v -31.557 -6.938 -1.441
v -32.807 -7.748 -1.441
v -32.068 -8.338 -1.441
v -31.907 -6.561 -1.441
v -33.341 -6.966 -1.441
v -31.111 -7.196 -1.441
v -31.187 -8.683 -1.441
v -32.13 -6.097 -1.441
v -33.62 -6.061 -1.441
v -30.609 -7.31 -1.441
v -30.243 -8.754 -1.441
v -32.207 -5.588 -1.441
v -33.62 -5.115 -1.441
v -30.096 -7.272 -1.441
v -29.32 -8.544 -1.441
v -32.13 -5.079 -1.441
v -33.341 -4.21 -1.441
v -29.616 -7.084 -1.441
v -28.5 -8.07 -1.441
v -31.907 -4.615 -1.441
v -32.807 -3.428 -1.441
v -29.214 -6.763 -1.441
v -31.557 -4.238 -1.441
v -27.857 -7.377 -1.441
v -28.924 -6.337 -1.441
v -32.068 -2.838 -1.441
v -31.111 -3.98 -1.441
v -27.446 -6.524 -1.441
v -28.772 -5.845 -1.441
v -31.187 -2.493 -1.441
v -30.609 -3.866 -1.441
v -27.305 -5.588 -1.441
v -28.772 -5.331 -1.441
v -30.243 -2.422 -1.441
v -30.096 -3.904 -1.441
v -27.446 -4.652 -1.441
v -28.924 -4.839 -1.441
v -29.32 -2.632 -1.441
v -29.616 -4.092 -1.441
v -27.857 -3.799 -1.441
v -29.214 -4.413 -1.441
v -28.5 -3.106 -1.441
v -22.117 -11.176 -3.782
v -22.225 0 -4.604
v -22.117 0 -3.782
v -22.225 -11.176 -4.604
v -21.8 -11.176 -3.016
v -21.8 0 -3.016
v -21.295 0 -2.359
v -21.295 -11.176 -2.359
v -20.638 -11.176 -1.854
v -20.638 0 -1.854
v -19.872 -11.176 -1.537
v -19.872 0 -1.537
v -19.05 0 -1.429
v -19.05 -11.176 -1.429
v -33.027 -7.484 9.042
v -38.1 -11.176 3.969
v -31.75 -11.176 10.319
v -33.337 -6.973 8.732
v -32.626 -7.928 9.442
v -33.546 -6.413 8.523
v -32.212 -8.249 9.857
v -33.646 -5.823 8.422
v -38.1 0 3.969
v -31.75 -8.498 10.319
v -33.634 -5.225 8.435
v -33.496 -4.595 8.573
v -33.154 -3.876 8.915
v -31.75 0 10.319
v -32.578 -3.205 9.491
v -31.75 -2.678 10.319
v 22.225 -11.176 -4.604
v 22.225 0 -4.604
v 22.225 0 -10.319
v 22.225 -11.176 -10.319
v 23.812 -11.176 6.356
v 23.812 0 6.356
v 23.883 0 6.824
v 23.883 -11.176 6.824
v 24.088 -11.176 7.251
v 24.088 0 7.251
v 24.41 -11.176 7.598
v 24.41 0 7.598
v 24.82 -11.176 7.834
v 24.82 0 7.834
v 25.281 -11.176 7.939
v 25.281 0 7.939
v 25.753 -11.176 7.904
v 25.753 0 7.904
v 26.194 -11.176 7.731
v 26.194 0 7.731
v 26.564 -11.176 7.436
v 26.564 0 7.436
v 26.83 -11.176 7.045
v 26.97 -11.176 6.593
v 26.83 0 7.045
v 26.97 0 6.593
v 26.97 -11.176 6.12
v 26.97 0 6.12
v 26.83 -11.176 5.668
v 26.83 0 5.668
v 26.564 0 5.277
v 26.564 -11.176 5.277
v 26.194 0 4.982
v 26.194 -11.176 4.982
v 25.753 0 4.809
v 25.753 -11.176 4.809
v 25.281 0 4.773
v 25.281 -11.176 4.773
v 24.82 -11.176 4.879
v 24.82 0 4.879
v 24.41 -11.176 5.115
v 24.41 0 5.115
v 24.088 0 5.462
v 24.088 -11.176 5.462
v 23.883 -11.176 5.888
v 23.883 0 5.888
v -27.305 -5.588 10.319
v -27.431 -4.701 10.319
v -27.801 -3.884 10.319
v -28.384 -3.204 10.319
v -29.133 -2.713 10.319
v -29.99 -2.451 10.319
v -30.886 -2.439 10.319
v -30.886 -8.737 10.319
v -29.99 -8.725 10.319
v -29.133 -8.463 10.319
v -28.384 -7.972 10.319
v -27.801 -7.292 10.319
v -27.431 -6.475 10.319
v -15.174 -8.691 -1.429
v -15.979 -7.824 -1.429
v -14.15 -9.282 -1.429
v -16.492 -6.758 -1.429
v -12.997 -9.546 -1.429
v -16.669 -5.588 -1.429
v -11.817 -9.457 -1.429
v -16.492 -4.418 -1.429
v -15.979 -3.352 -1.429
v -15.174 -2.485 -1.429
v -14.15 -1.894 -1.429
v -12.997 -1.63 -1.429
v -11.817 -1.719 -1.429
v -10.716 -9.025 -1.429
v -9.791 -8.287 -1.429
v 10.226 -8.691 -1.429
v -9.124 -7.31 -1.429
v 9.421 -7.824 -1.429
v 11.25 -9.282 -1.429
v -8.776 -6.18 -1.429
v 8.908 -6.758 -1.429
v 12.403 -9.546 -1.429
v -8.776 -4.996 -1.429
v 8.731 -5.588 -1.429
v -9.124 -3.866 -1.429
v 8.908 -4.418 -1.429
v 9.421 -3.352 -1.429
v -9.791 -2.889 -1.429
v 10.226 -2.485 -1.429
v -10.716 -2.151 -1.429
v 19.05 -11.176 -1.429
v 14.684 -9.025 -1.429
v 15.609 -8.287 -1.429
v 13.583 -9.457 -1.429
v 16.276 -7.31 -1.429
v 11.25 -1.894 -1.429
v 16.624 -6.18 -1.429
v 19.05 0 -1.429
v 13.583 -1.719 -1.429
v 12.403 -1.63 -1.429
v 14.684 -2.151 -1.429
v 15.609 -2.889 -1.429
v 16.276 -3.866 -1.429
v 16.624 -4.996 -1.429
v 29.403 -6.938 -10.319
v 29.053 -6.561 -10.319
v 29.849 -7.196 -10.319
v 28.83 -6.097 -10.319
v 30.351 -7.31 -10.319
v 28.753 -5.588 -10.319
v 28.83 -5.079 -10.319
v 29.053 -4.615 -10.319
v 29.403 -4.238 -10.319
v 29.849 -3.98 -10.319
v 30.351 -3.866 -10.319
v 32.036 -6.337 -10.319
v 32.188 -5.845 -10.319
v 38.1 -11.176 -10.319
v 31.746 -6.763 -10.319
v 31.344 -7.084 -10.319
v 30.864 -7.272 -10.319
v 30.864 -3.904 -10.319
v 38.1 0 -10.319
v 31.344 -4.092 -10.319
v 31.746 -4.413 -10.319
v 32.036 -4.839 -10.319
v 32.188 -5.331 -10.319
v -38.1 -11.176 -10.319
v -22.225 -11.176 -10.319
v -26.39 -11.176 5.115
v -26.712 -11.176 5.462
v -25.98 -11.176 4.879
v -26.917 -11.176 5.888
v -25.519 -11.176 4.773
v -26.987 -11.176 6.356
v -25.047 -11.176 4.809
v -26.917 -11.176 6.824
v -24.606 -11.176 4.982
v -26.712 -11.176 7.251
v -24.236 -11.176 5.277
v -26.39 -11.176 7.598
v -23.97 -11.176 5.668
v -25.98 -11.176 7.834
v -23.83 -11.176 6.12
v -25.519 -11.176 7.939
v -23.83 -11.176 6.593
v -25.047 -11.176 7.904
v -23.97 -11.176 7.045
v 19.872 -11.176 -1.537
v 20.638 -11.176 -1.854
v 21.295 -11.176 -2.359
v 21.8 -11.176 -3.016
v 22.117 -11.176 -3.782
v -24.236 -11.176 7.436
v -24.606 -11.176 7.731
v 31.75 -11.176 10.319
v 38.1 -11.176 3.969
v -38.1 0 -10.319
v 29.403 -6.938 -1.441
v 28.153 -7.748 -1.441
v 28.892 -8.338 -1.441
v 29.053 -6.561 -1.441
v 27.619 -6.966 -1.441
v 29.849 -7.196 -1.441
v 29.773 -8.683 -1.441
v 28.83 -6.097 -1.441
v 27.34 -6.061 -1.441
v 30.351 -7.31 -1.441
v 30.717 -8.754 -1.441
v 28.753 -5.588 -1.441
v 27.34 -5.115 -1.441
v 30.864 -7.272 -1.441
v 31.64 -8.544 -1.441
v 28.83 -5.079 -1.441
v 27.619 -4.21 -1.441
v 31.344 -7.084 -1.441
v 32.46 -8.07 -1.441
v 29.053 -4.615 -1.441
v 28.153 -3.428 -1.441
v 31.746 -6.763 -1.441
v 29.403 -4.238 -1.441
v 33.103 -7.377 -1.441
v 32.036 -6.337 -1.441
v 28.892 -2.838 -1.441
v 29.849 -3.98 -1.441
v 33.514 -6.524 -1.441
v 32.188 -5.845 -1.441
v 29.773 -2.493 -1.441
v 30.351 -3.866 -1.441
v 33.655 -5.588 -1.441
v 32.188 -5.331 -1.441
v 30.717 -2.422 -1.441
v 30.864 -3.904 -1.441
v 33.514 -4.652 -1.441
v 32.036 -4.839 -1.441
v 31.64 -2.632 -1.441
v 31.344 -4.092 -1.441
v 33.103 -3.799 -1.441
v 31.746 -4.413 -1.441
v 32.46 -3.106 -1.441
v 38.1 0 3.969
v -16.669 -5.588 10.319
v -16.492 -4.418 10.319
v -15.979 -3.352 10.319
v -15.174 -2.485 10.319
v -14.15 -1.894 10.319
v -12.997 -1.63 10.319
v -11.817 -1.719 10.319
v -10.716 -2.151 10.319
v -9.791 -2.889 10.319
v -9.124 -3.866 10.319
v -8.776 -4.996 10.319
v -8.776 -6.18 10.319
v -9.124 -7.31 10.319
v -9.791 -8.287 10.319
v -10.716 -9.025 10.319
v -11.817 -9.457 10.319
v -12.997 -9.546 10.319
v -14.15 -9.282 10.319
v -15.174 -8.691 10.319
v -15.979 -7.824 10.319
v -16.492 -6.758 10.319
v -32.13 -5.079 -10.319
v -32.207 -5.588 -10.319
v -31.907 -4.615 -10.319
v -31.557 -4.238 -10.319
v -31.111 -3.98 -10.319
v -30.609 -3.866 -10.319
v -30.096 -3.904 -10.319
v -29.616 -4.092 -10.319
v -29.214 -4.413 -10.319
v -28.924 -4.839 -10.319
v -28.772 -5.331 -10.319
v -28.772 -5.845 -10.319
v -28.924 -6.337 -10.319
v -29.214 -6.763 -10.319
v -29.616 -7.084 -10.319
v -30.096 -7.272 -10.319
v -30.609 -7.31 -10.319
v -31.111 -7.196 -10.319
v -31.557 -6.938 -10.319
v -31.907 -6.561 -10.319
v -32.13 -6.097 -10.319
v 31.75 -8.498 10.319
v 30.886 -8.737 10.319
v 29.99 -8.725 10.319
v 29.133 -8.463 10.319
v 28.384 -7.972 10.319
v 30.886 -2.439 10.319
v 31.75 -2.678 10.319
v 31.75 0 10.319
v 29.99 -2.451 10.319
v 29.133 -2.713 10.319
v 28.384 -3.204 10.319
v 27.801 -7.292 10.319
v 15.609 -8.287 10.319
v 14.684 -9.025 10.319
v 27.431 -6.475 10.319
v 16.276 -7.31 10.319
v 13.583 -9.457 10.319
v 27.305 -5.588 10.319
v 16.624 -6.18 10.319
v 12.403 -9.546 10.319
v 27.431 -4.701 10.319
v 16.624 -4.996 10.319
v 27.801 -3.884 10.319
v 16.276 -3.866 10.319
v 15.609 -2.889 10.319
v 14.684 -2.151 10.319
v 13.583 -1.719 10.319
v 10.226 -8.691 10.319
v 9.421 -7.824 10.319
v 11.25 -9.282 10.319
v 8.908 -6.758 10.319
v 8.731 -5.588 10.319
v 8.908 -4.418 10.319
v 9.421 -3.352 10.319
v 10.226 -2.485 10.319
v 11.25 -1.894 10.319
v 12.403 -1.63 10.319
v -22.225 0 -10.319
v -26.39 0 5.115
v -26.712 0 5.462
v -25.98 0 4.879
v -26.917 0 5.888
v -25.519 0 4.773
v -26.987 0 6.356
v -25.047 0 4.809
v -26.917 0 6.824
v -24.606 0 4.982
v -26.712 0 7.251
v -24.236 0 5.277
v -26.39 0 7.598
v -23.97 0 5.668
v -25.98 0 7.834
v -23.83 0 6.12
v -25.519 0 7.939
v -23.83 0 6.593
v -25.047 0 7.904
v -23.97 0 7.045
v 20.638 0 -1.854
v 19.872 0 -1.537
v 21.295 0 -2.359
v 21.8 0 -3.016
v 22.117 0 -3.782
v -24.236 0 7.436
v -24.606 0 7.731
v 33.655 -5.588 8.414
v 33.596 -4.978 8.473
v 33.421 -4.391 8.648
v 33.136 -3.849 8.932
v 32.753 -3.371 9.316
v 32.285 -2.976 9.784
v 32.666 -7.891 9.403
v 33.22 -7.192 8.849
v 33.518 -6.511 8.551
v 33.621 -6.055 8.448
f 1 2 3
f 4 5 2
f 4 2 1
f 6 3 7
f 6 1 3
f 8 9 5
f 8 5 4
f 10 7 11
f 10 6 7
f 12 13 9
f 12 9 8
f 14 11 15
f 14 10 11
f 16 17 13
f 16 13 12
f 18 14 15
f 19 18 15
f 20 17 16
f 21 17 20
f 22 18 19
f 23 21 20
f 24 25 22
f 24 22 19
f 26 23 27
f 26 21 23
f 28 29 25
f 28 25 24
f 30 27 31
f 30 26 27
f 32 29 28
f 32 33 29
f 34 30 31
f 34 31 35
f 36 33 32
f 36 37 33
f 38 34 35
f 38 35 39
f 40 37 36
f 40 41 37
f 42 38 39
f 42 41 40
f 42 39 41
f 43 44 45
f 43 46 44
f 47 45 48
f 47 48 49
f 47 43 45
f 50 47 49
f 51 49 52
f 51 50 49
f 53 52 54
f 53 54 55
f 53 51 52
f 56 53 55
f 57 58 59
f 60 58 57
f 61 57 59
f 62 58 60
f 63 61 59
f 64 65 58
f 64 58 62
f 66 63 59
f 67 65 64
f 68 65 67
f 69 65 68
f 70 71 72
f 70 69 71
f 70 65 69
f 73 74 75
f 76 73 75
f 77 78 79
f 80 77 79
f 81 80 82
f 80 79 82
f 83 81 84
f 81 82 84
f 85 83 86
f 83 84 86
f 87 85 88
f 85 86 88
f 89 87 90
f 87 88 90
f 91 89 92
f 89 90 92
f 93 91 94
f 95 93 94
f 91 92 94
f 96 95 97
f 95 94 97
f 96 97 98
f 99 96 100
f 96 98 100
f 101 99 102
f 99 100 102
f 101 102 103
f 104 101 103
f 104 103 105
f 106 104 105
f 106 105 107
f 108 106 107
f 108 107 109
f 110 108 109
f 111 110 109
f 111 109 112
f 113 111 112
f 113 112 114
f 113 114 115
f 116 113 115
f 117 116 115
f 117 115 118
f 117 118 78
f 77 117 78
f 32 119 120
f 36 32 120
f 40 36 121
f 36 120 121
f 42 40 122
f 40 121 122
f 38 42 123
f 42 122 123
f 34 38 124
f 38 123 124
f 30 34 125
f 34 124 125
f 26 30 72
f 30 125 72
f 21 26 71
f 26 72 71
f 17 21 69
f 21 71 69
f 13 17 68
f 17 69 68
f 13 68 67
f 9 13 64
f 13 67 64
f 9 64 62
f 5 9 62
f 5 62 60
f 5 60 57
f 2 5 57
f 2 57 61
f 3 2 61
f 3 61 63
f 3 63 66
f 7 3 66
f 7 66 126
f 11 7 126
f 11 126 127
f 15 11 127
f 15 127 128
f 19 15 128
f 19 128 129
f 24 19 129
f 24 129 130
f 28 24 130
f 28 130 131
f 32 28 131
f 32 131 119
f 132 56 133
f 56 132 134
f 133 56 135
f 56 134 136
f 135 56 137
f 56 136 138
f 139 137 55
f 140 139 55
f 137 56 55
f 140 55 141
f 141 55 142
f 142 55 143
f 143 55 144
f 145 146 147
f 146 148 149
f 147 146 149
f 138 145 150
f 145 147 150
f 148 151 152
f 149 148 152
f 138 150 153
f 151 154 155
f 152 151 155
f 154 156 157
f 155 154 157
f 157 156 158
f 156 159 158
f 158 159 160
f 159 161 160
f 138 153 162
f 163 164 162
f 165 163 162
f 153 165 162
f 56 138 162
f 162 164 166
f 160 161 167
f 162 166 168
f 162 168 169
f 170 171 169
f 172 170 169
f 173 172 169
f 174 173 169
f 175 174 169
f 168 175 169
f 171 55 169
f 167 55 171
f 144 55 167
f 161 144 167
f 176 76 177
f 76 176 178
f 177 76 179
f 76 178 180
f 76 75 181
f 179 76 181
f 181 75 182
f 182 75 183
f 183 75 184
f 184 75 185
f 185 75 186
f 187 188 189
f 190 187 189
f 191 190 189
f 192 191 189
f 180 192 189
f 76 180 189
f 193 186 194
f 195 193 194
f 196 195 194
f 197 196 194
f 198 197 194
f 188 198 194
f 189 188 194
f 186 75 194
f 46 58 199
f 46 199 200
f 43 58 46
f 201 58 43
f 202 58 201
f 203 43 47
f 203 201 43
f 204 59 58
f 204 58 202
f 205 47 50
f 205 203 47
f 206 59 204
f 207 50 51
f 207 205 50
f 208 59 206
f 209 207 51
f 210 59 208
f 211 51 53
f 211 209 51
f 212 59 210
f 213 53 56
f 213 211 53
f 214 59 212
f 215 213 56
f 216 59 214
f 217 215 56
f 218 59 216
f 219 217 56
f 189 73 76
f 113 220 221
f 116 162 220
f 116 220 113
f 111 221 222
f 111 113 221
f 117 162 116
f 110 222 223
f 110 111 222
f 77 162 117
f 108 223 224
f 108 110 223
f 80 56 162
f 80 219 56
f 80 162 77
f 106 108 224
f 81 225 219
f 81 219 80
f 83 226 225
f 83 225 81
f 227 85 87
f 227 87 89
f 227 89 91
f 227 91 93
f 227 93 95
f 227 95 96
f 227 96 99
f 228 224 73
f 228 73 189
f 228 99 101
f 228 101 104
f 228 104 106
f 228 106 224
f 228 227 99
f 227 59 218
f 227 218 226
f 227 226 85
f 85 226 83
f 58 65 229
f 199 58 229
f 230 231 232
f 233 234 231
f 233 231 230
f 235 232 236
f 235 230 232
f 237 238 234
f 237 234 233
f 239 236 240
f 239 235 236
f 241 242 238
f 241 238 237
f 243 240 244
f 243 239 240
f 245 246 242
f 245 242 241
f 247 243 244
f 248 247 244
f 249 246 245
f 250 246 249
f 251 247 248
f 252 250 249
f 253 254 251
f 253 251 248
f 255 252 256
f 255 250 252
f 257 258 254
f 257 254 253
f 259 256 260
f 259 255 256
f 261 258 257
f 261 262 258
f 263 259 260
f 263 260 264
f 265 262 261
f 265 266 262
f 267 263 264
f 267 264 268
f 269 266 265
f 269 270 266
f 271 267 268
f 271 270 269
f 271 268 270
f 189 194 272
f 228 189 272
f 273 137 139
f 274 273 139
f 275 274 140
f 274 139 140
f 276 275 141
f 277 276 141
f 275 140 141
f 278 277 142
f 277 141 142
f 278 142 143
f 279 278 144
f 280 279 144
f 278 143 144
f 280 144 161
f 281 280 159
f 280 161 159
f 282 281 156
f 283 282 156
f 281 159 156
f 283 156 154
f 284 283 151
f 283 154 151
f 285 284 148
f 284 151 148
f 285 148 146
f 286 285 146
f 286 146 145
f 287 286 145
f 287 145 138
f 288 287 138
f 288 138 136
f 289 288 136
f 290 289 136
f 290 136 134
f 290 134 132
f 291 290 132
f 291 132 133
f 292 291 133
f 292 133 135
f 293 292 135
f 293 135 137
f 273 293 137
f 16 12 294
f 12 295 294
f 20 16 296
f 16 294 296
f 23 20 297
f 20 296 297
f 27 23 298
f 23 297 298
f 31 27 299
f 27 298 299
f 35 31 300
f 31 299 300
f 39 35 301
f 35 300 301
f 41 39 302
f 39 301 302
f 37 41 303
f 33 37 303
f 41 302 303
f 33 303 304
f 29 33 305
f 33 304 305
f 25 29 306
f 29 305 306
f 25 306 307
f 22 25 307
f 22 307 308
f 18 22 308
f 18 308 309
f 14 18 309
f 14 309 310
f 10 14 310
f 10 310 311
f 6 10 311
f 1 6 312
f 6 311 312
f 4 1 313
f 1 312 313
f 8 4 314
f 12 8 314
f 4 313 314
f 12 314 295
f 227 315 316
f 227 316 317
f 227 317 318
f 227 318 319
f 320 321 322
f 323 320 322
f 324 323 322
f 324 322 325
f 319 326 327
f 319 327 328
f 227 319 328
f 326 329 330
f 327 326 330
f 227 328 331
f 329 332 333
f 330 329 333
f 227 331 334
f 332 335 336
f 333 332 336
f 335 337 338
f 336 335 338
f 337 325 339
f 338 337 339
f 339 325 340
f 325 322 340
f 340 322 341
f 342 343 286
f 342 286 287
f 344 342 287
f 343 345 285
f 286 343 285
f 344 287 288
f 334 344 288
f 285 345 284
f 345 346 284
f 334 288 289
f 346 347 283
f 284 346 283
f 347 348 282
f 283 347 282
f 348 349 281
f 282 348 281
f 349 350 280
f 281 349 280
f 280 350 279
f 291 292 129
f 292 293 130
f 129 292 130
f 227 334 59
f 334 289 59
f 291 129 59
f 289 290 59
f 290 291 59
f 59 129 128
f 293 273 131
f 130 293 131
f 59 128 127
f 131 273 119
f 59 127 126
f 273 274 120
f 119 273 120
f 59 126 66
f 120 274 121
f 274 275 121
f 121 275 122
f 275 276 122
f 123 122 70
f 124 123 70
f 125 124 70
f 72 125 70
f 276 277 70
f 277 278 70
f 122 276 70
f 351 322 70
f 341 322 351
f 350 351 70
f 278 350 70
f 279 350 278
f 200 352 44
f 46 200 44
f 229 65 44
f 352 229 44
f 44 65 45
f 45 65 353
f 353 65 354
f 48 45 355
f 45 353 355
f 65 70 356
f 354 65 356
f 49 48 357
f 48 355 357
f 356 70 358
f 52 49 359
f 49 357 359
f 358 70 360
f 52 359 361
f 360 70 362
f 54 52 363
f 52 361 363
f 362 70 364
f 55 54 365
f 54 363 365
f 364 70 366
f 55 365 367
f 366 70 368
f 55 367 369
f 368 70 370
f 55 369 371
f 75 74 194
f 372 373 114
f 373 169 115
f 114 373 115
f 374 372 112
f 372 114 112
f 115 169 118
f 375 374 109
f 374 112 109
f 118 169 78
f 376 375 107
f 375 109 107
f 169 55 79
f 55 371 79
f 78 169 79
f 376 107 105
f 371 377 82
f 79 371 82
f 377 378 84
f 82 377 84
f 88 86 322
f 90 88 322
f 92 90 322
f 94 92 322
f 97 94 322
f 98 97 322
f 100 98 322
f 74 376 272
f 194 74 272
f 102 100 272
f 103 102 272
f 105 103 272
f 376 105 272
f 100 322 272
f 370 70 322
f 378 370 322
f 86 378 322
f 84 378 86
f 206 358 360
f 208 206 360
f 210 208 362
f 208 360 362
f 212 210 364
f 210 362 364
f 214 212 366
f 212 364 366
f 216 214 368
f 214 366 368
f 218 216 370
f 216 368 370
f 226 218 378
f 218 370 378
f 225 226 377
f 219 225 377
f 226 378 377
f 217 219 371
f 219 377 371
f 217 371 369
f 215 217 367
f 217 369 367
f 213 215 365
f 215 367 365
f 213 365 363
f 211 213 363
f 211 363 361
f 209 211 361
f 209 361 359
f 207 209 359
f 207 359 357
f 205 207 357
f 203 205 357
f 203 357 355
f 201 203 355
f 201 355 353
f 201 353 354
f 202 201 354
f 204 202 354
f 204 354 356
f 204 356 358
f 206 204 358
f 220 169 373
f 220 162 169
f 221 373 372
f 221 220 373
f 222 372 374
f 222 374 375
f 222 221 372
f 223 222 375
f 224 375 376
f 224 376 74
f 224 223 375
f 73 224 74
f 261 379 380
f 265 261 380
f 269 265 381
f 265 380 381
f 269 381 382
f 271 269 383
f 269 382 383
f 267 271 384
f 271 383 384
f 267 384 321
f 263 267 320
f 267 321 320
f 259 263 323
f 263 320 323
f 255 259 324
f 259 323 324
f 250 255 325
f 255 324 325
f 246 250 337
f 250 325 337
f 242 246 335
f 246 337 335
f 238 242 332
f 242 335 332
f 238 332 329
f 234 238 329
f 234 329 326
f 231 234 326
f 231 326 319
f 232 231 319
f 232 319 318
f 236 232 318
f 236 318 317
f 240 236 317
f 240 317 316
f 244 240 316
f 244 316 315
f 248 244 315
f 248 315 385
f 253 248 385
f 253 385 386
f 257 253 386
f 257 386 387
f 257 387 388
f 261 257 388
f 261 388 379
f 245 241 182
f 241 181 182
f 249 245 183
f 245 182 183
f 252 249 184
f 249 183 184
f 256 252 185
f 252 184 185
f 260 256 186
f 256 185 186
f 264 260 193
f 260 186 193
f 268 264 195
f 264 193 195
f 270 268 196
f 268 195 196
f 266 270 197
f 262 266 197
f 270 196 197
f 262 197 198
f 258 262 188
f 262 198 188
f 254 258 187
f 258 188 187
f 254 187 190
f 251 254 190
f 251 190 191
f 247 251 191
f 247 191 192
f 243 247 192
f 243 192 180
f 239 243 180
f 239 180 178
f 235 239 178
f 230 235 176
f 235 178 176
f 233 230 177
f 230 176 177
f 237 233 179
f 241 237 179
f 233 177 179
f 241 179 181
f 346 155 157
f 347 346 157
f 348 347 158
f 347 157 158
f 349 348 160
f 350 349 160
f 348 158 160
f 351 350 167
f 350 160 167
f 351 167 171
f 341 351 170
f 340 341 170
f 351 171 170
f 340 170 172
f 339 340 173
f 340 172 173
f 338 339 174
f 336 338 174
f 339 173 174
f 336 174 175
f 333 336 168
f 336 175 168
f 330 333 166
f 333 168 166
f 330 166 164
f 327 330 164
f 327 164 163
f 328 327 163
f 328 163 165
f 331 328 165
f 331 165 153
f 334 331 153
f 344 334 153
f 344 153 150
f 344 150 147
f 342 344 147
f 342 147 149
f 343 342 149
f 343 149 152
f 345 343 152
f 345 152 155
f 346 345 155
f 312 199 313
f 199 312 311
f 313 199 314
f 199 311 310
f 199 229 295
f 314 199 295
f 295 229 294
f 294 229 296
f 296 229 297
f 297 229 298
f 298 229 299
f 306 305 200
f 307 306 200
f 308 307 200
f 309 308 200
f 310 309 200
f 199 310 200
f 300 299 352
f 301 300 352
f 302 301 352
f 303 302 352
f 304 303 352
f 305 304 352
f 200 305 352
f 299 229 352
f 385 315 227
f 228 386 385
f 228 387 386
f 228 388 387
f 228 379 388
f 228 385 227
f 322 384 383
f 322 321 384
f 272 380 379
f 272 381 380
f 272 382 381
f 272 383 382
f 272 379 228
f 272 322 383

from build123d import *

# Parameters (mm, degrees)
F1_DEPTH       = 11.176
F2_R           = 3.175
F5_D           = 3.4544
F5_START       = 10.33145
F5_CBORE_D     = 6.35
F5_CBORE_DEPTH = 11.7602
F6_T1_DEPTH    = 43.8363739472
F8_D           = 7.9375
F10_D          = 3.175


# Not quite as in the source:
# - a fillet or chamfer that OpenCascade refuses, or shapes differently, is made with other operations: its cross-section is extruded or revolved along the edge and cut away or added


with BuildPart() as f1:
    # F0 (on Front) → F1 (new body)
    with BuildSketch(Plane.XZ):
        Polygon((38.1, 10.31875), (-38.1, 10.31875), (-38.1, -10.31875), (-22.225, -10.31875), (-22.225, -1.42875), (22.225, -1.42875), (22.225, -10.31875), (38.1, -10.31875), align=None)
    extrude(amount=F1_DEPTH)

    # F2
    f2_edges = [f1.edges().sort_by_distance(p)[0] for p in [
        (-22.225, -5.588, -1.42875),
        (22.225, -5.588, -1.42875),
    ]]
    fillet(f2_edges, radius=F2_R)

    # F5 (through all)
    # its depths count from where the whole tool has entered the part; down to there all is cleared
    with Locations(Plane.XY.offset(20.6502).offset(-F5_START)):
        with Locations((-30.48, -5.588), (30.48, -5.588)):
            CounterBoreHole(F5_D / 2, F5_CBORE_D / 2, F5_CBORE_DEPTH)

    # F6: chamfer of 6.35 on 2 edges, made by hand

    # F6_s2 → F6_t1 (cut)
    with BuildSketch(Plane.XZ.offset(-16.3301869736)):
        Polygon((-38.1, 3.96875), (-31.75, 10.31875), (-38.1, 10.31875), align=None)
        Polygon((31.75, 10.31875), (38.1, 3.96875), (38.1, 10.31875), align=None)
    extrude(amount=F6_T1_DEPTH, mode=Mode.SUBTRACT)

    # F8 (through all)
    with Locations(Plane.XY.offset(20.6502)):
        with Locations((-12.7, -5.588), (12.7, -5.588)):
            Hole(F8_D / 2)

    # F10 (through all)
    with Locations(Plane.XZ.offset(11.176)):
        with Locations((-25.4, 6.35635), (25.4, 6.35635)):
            Hole(F10_D / 2)


solid = f1.part
